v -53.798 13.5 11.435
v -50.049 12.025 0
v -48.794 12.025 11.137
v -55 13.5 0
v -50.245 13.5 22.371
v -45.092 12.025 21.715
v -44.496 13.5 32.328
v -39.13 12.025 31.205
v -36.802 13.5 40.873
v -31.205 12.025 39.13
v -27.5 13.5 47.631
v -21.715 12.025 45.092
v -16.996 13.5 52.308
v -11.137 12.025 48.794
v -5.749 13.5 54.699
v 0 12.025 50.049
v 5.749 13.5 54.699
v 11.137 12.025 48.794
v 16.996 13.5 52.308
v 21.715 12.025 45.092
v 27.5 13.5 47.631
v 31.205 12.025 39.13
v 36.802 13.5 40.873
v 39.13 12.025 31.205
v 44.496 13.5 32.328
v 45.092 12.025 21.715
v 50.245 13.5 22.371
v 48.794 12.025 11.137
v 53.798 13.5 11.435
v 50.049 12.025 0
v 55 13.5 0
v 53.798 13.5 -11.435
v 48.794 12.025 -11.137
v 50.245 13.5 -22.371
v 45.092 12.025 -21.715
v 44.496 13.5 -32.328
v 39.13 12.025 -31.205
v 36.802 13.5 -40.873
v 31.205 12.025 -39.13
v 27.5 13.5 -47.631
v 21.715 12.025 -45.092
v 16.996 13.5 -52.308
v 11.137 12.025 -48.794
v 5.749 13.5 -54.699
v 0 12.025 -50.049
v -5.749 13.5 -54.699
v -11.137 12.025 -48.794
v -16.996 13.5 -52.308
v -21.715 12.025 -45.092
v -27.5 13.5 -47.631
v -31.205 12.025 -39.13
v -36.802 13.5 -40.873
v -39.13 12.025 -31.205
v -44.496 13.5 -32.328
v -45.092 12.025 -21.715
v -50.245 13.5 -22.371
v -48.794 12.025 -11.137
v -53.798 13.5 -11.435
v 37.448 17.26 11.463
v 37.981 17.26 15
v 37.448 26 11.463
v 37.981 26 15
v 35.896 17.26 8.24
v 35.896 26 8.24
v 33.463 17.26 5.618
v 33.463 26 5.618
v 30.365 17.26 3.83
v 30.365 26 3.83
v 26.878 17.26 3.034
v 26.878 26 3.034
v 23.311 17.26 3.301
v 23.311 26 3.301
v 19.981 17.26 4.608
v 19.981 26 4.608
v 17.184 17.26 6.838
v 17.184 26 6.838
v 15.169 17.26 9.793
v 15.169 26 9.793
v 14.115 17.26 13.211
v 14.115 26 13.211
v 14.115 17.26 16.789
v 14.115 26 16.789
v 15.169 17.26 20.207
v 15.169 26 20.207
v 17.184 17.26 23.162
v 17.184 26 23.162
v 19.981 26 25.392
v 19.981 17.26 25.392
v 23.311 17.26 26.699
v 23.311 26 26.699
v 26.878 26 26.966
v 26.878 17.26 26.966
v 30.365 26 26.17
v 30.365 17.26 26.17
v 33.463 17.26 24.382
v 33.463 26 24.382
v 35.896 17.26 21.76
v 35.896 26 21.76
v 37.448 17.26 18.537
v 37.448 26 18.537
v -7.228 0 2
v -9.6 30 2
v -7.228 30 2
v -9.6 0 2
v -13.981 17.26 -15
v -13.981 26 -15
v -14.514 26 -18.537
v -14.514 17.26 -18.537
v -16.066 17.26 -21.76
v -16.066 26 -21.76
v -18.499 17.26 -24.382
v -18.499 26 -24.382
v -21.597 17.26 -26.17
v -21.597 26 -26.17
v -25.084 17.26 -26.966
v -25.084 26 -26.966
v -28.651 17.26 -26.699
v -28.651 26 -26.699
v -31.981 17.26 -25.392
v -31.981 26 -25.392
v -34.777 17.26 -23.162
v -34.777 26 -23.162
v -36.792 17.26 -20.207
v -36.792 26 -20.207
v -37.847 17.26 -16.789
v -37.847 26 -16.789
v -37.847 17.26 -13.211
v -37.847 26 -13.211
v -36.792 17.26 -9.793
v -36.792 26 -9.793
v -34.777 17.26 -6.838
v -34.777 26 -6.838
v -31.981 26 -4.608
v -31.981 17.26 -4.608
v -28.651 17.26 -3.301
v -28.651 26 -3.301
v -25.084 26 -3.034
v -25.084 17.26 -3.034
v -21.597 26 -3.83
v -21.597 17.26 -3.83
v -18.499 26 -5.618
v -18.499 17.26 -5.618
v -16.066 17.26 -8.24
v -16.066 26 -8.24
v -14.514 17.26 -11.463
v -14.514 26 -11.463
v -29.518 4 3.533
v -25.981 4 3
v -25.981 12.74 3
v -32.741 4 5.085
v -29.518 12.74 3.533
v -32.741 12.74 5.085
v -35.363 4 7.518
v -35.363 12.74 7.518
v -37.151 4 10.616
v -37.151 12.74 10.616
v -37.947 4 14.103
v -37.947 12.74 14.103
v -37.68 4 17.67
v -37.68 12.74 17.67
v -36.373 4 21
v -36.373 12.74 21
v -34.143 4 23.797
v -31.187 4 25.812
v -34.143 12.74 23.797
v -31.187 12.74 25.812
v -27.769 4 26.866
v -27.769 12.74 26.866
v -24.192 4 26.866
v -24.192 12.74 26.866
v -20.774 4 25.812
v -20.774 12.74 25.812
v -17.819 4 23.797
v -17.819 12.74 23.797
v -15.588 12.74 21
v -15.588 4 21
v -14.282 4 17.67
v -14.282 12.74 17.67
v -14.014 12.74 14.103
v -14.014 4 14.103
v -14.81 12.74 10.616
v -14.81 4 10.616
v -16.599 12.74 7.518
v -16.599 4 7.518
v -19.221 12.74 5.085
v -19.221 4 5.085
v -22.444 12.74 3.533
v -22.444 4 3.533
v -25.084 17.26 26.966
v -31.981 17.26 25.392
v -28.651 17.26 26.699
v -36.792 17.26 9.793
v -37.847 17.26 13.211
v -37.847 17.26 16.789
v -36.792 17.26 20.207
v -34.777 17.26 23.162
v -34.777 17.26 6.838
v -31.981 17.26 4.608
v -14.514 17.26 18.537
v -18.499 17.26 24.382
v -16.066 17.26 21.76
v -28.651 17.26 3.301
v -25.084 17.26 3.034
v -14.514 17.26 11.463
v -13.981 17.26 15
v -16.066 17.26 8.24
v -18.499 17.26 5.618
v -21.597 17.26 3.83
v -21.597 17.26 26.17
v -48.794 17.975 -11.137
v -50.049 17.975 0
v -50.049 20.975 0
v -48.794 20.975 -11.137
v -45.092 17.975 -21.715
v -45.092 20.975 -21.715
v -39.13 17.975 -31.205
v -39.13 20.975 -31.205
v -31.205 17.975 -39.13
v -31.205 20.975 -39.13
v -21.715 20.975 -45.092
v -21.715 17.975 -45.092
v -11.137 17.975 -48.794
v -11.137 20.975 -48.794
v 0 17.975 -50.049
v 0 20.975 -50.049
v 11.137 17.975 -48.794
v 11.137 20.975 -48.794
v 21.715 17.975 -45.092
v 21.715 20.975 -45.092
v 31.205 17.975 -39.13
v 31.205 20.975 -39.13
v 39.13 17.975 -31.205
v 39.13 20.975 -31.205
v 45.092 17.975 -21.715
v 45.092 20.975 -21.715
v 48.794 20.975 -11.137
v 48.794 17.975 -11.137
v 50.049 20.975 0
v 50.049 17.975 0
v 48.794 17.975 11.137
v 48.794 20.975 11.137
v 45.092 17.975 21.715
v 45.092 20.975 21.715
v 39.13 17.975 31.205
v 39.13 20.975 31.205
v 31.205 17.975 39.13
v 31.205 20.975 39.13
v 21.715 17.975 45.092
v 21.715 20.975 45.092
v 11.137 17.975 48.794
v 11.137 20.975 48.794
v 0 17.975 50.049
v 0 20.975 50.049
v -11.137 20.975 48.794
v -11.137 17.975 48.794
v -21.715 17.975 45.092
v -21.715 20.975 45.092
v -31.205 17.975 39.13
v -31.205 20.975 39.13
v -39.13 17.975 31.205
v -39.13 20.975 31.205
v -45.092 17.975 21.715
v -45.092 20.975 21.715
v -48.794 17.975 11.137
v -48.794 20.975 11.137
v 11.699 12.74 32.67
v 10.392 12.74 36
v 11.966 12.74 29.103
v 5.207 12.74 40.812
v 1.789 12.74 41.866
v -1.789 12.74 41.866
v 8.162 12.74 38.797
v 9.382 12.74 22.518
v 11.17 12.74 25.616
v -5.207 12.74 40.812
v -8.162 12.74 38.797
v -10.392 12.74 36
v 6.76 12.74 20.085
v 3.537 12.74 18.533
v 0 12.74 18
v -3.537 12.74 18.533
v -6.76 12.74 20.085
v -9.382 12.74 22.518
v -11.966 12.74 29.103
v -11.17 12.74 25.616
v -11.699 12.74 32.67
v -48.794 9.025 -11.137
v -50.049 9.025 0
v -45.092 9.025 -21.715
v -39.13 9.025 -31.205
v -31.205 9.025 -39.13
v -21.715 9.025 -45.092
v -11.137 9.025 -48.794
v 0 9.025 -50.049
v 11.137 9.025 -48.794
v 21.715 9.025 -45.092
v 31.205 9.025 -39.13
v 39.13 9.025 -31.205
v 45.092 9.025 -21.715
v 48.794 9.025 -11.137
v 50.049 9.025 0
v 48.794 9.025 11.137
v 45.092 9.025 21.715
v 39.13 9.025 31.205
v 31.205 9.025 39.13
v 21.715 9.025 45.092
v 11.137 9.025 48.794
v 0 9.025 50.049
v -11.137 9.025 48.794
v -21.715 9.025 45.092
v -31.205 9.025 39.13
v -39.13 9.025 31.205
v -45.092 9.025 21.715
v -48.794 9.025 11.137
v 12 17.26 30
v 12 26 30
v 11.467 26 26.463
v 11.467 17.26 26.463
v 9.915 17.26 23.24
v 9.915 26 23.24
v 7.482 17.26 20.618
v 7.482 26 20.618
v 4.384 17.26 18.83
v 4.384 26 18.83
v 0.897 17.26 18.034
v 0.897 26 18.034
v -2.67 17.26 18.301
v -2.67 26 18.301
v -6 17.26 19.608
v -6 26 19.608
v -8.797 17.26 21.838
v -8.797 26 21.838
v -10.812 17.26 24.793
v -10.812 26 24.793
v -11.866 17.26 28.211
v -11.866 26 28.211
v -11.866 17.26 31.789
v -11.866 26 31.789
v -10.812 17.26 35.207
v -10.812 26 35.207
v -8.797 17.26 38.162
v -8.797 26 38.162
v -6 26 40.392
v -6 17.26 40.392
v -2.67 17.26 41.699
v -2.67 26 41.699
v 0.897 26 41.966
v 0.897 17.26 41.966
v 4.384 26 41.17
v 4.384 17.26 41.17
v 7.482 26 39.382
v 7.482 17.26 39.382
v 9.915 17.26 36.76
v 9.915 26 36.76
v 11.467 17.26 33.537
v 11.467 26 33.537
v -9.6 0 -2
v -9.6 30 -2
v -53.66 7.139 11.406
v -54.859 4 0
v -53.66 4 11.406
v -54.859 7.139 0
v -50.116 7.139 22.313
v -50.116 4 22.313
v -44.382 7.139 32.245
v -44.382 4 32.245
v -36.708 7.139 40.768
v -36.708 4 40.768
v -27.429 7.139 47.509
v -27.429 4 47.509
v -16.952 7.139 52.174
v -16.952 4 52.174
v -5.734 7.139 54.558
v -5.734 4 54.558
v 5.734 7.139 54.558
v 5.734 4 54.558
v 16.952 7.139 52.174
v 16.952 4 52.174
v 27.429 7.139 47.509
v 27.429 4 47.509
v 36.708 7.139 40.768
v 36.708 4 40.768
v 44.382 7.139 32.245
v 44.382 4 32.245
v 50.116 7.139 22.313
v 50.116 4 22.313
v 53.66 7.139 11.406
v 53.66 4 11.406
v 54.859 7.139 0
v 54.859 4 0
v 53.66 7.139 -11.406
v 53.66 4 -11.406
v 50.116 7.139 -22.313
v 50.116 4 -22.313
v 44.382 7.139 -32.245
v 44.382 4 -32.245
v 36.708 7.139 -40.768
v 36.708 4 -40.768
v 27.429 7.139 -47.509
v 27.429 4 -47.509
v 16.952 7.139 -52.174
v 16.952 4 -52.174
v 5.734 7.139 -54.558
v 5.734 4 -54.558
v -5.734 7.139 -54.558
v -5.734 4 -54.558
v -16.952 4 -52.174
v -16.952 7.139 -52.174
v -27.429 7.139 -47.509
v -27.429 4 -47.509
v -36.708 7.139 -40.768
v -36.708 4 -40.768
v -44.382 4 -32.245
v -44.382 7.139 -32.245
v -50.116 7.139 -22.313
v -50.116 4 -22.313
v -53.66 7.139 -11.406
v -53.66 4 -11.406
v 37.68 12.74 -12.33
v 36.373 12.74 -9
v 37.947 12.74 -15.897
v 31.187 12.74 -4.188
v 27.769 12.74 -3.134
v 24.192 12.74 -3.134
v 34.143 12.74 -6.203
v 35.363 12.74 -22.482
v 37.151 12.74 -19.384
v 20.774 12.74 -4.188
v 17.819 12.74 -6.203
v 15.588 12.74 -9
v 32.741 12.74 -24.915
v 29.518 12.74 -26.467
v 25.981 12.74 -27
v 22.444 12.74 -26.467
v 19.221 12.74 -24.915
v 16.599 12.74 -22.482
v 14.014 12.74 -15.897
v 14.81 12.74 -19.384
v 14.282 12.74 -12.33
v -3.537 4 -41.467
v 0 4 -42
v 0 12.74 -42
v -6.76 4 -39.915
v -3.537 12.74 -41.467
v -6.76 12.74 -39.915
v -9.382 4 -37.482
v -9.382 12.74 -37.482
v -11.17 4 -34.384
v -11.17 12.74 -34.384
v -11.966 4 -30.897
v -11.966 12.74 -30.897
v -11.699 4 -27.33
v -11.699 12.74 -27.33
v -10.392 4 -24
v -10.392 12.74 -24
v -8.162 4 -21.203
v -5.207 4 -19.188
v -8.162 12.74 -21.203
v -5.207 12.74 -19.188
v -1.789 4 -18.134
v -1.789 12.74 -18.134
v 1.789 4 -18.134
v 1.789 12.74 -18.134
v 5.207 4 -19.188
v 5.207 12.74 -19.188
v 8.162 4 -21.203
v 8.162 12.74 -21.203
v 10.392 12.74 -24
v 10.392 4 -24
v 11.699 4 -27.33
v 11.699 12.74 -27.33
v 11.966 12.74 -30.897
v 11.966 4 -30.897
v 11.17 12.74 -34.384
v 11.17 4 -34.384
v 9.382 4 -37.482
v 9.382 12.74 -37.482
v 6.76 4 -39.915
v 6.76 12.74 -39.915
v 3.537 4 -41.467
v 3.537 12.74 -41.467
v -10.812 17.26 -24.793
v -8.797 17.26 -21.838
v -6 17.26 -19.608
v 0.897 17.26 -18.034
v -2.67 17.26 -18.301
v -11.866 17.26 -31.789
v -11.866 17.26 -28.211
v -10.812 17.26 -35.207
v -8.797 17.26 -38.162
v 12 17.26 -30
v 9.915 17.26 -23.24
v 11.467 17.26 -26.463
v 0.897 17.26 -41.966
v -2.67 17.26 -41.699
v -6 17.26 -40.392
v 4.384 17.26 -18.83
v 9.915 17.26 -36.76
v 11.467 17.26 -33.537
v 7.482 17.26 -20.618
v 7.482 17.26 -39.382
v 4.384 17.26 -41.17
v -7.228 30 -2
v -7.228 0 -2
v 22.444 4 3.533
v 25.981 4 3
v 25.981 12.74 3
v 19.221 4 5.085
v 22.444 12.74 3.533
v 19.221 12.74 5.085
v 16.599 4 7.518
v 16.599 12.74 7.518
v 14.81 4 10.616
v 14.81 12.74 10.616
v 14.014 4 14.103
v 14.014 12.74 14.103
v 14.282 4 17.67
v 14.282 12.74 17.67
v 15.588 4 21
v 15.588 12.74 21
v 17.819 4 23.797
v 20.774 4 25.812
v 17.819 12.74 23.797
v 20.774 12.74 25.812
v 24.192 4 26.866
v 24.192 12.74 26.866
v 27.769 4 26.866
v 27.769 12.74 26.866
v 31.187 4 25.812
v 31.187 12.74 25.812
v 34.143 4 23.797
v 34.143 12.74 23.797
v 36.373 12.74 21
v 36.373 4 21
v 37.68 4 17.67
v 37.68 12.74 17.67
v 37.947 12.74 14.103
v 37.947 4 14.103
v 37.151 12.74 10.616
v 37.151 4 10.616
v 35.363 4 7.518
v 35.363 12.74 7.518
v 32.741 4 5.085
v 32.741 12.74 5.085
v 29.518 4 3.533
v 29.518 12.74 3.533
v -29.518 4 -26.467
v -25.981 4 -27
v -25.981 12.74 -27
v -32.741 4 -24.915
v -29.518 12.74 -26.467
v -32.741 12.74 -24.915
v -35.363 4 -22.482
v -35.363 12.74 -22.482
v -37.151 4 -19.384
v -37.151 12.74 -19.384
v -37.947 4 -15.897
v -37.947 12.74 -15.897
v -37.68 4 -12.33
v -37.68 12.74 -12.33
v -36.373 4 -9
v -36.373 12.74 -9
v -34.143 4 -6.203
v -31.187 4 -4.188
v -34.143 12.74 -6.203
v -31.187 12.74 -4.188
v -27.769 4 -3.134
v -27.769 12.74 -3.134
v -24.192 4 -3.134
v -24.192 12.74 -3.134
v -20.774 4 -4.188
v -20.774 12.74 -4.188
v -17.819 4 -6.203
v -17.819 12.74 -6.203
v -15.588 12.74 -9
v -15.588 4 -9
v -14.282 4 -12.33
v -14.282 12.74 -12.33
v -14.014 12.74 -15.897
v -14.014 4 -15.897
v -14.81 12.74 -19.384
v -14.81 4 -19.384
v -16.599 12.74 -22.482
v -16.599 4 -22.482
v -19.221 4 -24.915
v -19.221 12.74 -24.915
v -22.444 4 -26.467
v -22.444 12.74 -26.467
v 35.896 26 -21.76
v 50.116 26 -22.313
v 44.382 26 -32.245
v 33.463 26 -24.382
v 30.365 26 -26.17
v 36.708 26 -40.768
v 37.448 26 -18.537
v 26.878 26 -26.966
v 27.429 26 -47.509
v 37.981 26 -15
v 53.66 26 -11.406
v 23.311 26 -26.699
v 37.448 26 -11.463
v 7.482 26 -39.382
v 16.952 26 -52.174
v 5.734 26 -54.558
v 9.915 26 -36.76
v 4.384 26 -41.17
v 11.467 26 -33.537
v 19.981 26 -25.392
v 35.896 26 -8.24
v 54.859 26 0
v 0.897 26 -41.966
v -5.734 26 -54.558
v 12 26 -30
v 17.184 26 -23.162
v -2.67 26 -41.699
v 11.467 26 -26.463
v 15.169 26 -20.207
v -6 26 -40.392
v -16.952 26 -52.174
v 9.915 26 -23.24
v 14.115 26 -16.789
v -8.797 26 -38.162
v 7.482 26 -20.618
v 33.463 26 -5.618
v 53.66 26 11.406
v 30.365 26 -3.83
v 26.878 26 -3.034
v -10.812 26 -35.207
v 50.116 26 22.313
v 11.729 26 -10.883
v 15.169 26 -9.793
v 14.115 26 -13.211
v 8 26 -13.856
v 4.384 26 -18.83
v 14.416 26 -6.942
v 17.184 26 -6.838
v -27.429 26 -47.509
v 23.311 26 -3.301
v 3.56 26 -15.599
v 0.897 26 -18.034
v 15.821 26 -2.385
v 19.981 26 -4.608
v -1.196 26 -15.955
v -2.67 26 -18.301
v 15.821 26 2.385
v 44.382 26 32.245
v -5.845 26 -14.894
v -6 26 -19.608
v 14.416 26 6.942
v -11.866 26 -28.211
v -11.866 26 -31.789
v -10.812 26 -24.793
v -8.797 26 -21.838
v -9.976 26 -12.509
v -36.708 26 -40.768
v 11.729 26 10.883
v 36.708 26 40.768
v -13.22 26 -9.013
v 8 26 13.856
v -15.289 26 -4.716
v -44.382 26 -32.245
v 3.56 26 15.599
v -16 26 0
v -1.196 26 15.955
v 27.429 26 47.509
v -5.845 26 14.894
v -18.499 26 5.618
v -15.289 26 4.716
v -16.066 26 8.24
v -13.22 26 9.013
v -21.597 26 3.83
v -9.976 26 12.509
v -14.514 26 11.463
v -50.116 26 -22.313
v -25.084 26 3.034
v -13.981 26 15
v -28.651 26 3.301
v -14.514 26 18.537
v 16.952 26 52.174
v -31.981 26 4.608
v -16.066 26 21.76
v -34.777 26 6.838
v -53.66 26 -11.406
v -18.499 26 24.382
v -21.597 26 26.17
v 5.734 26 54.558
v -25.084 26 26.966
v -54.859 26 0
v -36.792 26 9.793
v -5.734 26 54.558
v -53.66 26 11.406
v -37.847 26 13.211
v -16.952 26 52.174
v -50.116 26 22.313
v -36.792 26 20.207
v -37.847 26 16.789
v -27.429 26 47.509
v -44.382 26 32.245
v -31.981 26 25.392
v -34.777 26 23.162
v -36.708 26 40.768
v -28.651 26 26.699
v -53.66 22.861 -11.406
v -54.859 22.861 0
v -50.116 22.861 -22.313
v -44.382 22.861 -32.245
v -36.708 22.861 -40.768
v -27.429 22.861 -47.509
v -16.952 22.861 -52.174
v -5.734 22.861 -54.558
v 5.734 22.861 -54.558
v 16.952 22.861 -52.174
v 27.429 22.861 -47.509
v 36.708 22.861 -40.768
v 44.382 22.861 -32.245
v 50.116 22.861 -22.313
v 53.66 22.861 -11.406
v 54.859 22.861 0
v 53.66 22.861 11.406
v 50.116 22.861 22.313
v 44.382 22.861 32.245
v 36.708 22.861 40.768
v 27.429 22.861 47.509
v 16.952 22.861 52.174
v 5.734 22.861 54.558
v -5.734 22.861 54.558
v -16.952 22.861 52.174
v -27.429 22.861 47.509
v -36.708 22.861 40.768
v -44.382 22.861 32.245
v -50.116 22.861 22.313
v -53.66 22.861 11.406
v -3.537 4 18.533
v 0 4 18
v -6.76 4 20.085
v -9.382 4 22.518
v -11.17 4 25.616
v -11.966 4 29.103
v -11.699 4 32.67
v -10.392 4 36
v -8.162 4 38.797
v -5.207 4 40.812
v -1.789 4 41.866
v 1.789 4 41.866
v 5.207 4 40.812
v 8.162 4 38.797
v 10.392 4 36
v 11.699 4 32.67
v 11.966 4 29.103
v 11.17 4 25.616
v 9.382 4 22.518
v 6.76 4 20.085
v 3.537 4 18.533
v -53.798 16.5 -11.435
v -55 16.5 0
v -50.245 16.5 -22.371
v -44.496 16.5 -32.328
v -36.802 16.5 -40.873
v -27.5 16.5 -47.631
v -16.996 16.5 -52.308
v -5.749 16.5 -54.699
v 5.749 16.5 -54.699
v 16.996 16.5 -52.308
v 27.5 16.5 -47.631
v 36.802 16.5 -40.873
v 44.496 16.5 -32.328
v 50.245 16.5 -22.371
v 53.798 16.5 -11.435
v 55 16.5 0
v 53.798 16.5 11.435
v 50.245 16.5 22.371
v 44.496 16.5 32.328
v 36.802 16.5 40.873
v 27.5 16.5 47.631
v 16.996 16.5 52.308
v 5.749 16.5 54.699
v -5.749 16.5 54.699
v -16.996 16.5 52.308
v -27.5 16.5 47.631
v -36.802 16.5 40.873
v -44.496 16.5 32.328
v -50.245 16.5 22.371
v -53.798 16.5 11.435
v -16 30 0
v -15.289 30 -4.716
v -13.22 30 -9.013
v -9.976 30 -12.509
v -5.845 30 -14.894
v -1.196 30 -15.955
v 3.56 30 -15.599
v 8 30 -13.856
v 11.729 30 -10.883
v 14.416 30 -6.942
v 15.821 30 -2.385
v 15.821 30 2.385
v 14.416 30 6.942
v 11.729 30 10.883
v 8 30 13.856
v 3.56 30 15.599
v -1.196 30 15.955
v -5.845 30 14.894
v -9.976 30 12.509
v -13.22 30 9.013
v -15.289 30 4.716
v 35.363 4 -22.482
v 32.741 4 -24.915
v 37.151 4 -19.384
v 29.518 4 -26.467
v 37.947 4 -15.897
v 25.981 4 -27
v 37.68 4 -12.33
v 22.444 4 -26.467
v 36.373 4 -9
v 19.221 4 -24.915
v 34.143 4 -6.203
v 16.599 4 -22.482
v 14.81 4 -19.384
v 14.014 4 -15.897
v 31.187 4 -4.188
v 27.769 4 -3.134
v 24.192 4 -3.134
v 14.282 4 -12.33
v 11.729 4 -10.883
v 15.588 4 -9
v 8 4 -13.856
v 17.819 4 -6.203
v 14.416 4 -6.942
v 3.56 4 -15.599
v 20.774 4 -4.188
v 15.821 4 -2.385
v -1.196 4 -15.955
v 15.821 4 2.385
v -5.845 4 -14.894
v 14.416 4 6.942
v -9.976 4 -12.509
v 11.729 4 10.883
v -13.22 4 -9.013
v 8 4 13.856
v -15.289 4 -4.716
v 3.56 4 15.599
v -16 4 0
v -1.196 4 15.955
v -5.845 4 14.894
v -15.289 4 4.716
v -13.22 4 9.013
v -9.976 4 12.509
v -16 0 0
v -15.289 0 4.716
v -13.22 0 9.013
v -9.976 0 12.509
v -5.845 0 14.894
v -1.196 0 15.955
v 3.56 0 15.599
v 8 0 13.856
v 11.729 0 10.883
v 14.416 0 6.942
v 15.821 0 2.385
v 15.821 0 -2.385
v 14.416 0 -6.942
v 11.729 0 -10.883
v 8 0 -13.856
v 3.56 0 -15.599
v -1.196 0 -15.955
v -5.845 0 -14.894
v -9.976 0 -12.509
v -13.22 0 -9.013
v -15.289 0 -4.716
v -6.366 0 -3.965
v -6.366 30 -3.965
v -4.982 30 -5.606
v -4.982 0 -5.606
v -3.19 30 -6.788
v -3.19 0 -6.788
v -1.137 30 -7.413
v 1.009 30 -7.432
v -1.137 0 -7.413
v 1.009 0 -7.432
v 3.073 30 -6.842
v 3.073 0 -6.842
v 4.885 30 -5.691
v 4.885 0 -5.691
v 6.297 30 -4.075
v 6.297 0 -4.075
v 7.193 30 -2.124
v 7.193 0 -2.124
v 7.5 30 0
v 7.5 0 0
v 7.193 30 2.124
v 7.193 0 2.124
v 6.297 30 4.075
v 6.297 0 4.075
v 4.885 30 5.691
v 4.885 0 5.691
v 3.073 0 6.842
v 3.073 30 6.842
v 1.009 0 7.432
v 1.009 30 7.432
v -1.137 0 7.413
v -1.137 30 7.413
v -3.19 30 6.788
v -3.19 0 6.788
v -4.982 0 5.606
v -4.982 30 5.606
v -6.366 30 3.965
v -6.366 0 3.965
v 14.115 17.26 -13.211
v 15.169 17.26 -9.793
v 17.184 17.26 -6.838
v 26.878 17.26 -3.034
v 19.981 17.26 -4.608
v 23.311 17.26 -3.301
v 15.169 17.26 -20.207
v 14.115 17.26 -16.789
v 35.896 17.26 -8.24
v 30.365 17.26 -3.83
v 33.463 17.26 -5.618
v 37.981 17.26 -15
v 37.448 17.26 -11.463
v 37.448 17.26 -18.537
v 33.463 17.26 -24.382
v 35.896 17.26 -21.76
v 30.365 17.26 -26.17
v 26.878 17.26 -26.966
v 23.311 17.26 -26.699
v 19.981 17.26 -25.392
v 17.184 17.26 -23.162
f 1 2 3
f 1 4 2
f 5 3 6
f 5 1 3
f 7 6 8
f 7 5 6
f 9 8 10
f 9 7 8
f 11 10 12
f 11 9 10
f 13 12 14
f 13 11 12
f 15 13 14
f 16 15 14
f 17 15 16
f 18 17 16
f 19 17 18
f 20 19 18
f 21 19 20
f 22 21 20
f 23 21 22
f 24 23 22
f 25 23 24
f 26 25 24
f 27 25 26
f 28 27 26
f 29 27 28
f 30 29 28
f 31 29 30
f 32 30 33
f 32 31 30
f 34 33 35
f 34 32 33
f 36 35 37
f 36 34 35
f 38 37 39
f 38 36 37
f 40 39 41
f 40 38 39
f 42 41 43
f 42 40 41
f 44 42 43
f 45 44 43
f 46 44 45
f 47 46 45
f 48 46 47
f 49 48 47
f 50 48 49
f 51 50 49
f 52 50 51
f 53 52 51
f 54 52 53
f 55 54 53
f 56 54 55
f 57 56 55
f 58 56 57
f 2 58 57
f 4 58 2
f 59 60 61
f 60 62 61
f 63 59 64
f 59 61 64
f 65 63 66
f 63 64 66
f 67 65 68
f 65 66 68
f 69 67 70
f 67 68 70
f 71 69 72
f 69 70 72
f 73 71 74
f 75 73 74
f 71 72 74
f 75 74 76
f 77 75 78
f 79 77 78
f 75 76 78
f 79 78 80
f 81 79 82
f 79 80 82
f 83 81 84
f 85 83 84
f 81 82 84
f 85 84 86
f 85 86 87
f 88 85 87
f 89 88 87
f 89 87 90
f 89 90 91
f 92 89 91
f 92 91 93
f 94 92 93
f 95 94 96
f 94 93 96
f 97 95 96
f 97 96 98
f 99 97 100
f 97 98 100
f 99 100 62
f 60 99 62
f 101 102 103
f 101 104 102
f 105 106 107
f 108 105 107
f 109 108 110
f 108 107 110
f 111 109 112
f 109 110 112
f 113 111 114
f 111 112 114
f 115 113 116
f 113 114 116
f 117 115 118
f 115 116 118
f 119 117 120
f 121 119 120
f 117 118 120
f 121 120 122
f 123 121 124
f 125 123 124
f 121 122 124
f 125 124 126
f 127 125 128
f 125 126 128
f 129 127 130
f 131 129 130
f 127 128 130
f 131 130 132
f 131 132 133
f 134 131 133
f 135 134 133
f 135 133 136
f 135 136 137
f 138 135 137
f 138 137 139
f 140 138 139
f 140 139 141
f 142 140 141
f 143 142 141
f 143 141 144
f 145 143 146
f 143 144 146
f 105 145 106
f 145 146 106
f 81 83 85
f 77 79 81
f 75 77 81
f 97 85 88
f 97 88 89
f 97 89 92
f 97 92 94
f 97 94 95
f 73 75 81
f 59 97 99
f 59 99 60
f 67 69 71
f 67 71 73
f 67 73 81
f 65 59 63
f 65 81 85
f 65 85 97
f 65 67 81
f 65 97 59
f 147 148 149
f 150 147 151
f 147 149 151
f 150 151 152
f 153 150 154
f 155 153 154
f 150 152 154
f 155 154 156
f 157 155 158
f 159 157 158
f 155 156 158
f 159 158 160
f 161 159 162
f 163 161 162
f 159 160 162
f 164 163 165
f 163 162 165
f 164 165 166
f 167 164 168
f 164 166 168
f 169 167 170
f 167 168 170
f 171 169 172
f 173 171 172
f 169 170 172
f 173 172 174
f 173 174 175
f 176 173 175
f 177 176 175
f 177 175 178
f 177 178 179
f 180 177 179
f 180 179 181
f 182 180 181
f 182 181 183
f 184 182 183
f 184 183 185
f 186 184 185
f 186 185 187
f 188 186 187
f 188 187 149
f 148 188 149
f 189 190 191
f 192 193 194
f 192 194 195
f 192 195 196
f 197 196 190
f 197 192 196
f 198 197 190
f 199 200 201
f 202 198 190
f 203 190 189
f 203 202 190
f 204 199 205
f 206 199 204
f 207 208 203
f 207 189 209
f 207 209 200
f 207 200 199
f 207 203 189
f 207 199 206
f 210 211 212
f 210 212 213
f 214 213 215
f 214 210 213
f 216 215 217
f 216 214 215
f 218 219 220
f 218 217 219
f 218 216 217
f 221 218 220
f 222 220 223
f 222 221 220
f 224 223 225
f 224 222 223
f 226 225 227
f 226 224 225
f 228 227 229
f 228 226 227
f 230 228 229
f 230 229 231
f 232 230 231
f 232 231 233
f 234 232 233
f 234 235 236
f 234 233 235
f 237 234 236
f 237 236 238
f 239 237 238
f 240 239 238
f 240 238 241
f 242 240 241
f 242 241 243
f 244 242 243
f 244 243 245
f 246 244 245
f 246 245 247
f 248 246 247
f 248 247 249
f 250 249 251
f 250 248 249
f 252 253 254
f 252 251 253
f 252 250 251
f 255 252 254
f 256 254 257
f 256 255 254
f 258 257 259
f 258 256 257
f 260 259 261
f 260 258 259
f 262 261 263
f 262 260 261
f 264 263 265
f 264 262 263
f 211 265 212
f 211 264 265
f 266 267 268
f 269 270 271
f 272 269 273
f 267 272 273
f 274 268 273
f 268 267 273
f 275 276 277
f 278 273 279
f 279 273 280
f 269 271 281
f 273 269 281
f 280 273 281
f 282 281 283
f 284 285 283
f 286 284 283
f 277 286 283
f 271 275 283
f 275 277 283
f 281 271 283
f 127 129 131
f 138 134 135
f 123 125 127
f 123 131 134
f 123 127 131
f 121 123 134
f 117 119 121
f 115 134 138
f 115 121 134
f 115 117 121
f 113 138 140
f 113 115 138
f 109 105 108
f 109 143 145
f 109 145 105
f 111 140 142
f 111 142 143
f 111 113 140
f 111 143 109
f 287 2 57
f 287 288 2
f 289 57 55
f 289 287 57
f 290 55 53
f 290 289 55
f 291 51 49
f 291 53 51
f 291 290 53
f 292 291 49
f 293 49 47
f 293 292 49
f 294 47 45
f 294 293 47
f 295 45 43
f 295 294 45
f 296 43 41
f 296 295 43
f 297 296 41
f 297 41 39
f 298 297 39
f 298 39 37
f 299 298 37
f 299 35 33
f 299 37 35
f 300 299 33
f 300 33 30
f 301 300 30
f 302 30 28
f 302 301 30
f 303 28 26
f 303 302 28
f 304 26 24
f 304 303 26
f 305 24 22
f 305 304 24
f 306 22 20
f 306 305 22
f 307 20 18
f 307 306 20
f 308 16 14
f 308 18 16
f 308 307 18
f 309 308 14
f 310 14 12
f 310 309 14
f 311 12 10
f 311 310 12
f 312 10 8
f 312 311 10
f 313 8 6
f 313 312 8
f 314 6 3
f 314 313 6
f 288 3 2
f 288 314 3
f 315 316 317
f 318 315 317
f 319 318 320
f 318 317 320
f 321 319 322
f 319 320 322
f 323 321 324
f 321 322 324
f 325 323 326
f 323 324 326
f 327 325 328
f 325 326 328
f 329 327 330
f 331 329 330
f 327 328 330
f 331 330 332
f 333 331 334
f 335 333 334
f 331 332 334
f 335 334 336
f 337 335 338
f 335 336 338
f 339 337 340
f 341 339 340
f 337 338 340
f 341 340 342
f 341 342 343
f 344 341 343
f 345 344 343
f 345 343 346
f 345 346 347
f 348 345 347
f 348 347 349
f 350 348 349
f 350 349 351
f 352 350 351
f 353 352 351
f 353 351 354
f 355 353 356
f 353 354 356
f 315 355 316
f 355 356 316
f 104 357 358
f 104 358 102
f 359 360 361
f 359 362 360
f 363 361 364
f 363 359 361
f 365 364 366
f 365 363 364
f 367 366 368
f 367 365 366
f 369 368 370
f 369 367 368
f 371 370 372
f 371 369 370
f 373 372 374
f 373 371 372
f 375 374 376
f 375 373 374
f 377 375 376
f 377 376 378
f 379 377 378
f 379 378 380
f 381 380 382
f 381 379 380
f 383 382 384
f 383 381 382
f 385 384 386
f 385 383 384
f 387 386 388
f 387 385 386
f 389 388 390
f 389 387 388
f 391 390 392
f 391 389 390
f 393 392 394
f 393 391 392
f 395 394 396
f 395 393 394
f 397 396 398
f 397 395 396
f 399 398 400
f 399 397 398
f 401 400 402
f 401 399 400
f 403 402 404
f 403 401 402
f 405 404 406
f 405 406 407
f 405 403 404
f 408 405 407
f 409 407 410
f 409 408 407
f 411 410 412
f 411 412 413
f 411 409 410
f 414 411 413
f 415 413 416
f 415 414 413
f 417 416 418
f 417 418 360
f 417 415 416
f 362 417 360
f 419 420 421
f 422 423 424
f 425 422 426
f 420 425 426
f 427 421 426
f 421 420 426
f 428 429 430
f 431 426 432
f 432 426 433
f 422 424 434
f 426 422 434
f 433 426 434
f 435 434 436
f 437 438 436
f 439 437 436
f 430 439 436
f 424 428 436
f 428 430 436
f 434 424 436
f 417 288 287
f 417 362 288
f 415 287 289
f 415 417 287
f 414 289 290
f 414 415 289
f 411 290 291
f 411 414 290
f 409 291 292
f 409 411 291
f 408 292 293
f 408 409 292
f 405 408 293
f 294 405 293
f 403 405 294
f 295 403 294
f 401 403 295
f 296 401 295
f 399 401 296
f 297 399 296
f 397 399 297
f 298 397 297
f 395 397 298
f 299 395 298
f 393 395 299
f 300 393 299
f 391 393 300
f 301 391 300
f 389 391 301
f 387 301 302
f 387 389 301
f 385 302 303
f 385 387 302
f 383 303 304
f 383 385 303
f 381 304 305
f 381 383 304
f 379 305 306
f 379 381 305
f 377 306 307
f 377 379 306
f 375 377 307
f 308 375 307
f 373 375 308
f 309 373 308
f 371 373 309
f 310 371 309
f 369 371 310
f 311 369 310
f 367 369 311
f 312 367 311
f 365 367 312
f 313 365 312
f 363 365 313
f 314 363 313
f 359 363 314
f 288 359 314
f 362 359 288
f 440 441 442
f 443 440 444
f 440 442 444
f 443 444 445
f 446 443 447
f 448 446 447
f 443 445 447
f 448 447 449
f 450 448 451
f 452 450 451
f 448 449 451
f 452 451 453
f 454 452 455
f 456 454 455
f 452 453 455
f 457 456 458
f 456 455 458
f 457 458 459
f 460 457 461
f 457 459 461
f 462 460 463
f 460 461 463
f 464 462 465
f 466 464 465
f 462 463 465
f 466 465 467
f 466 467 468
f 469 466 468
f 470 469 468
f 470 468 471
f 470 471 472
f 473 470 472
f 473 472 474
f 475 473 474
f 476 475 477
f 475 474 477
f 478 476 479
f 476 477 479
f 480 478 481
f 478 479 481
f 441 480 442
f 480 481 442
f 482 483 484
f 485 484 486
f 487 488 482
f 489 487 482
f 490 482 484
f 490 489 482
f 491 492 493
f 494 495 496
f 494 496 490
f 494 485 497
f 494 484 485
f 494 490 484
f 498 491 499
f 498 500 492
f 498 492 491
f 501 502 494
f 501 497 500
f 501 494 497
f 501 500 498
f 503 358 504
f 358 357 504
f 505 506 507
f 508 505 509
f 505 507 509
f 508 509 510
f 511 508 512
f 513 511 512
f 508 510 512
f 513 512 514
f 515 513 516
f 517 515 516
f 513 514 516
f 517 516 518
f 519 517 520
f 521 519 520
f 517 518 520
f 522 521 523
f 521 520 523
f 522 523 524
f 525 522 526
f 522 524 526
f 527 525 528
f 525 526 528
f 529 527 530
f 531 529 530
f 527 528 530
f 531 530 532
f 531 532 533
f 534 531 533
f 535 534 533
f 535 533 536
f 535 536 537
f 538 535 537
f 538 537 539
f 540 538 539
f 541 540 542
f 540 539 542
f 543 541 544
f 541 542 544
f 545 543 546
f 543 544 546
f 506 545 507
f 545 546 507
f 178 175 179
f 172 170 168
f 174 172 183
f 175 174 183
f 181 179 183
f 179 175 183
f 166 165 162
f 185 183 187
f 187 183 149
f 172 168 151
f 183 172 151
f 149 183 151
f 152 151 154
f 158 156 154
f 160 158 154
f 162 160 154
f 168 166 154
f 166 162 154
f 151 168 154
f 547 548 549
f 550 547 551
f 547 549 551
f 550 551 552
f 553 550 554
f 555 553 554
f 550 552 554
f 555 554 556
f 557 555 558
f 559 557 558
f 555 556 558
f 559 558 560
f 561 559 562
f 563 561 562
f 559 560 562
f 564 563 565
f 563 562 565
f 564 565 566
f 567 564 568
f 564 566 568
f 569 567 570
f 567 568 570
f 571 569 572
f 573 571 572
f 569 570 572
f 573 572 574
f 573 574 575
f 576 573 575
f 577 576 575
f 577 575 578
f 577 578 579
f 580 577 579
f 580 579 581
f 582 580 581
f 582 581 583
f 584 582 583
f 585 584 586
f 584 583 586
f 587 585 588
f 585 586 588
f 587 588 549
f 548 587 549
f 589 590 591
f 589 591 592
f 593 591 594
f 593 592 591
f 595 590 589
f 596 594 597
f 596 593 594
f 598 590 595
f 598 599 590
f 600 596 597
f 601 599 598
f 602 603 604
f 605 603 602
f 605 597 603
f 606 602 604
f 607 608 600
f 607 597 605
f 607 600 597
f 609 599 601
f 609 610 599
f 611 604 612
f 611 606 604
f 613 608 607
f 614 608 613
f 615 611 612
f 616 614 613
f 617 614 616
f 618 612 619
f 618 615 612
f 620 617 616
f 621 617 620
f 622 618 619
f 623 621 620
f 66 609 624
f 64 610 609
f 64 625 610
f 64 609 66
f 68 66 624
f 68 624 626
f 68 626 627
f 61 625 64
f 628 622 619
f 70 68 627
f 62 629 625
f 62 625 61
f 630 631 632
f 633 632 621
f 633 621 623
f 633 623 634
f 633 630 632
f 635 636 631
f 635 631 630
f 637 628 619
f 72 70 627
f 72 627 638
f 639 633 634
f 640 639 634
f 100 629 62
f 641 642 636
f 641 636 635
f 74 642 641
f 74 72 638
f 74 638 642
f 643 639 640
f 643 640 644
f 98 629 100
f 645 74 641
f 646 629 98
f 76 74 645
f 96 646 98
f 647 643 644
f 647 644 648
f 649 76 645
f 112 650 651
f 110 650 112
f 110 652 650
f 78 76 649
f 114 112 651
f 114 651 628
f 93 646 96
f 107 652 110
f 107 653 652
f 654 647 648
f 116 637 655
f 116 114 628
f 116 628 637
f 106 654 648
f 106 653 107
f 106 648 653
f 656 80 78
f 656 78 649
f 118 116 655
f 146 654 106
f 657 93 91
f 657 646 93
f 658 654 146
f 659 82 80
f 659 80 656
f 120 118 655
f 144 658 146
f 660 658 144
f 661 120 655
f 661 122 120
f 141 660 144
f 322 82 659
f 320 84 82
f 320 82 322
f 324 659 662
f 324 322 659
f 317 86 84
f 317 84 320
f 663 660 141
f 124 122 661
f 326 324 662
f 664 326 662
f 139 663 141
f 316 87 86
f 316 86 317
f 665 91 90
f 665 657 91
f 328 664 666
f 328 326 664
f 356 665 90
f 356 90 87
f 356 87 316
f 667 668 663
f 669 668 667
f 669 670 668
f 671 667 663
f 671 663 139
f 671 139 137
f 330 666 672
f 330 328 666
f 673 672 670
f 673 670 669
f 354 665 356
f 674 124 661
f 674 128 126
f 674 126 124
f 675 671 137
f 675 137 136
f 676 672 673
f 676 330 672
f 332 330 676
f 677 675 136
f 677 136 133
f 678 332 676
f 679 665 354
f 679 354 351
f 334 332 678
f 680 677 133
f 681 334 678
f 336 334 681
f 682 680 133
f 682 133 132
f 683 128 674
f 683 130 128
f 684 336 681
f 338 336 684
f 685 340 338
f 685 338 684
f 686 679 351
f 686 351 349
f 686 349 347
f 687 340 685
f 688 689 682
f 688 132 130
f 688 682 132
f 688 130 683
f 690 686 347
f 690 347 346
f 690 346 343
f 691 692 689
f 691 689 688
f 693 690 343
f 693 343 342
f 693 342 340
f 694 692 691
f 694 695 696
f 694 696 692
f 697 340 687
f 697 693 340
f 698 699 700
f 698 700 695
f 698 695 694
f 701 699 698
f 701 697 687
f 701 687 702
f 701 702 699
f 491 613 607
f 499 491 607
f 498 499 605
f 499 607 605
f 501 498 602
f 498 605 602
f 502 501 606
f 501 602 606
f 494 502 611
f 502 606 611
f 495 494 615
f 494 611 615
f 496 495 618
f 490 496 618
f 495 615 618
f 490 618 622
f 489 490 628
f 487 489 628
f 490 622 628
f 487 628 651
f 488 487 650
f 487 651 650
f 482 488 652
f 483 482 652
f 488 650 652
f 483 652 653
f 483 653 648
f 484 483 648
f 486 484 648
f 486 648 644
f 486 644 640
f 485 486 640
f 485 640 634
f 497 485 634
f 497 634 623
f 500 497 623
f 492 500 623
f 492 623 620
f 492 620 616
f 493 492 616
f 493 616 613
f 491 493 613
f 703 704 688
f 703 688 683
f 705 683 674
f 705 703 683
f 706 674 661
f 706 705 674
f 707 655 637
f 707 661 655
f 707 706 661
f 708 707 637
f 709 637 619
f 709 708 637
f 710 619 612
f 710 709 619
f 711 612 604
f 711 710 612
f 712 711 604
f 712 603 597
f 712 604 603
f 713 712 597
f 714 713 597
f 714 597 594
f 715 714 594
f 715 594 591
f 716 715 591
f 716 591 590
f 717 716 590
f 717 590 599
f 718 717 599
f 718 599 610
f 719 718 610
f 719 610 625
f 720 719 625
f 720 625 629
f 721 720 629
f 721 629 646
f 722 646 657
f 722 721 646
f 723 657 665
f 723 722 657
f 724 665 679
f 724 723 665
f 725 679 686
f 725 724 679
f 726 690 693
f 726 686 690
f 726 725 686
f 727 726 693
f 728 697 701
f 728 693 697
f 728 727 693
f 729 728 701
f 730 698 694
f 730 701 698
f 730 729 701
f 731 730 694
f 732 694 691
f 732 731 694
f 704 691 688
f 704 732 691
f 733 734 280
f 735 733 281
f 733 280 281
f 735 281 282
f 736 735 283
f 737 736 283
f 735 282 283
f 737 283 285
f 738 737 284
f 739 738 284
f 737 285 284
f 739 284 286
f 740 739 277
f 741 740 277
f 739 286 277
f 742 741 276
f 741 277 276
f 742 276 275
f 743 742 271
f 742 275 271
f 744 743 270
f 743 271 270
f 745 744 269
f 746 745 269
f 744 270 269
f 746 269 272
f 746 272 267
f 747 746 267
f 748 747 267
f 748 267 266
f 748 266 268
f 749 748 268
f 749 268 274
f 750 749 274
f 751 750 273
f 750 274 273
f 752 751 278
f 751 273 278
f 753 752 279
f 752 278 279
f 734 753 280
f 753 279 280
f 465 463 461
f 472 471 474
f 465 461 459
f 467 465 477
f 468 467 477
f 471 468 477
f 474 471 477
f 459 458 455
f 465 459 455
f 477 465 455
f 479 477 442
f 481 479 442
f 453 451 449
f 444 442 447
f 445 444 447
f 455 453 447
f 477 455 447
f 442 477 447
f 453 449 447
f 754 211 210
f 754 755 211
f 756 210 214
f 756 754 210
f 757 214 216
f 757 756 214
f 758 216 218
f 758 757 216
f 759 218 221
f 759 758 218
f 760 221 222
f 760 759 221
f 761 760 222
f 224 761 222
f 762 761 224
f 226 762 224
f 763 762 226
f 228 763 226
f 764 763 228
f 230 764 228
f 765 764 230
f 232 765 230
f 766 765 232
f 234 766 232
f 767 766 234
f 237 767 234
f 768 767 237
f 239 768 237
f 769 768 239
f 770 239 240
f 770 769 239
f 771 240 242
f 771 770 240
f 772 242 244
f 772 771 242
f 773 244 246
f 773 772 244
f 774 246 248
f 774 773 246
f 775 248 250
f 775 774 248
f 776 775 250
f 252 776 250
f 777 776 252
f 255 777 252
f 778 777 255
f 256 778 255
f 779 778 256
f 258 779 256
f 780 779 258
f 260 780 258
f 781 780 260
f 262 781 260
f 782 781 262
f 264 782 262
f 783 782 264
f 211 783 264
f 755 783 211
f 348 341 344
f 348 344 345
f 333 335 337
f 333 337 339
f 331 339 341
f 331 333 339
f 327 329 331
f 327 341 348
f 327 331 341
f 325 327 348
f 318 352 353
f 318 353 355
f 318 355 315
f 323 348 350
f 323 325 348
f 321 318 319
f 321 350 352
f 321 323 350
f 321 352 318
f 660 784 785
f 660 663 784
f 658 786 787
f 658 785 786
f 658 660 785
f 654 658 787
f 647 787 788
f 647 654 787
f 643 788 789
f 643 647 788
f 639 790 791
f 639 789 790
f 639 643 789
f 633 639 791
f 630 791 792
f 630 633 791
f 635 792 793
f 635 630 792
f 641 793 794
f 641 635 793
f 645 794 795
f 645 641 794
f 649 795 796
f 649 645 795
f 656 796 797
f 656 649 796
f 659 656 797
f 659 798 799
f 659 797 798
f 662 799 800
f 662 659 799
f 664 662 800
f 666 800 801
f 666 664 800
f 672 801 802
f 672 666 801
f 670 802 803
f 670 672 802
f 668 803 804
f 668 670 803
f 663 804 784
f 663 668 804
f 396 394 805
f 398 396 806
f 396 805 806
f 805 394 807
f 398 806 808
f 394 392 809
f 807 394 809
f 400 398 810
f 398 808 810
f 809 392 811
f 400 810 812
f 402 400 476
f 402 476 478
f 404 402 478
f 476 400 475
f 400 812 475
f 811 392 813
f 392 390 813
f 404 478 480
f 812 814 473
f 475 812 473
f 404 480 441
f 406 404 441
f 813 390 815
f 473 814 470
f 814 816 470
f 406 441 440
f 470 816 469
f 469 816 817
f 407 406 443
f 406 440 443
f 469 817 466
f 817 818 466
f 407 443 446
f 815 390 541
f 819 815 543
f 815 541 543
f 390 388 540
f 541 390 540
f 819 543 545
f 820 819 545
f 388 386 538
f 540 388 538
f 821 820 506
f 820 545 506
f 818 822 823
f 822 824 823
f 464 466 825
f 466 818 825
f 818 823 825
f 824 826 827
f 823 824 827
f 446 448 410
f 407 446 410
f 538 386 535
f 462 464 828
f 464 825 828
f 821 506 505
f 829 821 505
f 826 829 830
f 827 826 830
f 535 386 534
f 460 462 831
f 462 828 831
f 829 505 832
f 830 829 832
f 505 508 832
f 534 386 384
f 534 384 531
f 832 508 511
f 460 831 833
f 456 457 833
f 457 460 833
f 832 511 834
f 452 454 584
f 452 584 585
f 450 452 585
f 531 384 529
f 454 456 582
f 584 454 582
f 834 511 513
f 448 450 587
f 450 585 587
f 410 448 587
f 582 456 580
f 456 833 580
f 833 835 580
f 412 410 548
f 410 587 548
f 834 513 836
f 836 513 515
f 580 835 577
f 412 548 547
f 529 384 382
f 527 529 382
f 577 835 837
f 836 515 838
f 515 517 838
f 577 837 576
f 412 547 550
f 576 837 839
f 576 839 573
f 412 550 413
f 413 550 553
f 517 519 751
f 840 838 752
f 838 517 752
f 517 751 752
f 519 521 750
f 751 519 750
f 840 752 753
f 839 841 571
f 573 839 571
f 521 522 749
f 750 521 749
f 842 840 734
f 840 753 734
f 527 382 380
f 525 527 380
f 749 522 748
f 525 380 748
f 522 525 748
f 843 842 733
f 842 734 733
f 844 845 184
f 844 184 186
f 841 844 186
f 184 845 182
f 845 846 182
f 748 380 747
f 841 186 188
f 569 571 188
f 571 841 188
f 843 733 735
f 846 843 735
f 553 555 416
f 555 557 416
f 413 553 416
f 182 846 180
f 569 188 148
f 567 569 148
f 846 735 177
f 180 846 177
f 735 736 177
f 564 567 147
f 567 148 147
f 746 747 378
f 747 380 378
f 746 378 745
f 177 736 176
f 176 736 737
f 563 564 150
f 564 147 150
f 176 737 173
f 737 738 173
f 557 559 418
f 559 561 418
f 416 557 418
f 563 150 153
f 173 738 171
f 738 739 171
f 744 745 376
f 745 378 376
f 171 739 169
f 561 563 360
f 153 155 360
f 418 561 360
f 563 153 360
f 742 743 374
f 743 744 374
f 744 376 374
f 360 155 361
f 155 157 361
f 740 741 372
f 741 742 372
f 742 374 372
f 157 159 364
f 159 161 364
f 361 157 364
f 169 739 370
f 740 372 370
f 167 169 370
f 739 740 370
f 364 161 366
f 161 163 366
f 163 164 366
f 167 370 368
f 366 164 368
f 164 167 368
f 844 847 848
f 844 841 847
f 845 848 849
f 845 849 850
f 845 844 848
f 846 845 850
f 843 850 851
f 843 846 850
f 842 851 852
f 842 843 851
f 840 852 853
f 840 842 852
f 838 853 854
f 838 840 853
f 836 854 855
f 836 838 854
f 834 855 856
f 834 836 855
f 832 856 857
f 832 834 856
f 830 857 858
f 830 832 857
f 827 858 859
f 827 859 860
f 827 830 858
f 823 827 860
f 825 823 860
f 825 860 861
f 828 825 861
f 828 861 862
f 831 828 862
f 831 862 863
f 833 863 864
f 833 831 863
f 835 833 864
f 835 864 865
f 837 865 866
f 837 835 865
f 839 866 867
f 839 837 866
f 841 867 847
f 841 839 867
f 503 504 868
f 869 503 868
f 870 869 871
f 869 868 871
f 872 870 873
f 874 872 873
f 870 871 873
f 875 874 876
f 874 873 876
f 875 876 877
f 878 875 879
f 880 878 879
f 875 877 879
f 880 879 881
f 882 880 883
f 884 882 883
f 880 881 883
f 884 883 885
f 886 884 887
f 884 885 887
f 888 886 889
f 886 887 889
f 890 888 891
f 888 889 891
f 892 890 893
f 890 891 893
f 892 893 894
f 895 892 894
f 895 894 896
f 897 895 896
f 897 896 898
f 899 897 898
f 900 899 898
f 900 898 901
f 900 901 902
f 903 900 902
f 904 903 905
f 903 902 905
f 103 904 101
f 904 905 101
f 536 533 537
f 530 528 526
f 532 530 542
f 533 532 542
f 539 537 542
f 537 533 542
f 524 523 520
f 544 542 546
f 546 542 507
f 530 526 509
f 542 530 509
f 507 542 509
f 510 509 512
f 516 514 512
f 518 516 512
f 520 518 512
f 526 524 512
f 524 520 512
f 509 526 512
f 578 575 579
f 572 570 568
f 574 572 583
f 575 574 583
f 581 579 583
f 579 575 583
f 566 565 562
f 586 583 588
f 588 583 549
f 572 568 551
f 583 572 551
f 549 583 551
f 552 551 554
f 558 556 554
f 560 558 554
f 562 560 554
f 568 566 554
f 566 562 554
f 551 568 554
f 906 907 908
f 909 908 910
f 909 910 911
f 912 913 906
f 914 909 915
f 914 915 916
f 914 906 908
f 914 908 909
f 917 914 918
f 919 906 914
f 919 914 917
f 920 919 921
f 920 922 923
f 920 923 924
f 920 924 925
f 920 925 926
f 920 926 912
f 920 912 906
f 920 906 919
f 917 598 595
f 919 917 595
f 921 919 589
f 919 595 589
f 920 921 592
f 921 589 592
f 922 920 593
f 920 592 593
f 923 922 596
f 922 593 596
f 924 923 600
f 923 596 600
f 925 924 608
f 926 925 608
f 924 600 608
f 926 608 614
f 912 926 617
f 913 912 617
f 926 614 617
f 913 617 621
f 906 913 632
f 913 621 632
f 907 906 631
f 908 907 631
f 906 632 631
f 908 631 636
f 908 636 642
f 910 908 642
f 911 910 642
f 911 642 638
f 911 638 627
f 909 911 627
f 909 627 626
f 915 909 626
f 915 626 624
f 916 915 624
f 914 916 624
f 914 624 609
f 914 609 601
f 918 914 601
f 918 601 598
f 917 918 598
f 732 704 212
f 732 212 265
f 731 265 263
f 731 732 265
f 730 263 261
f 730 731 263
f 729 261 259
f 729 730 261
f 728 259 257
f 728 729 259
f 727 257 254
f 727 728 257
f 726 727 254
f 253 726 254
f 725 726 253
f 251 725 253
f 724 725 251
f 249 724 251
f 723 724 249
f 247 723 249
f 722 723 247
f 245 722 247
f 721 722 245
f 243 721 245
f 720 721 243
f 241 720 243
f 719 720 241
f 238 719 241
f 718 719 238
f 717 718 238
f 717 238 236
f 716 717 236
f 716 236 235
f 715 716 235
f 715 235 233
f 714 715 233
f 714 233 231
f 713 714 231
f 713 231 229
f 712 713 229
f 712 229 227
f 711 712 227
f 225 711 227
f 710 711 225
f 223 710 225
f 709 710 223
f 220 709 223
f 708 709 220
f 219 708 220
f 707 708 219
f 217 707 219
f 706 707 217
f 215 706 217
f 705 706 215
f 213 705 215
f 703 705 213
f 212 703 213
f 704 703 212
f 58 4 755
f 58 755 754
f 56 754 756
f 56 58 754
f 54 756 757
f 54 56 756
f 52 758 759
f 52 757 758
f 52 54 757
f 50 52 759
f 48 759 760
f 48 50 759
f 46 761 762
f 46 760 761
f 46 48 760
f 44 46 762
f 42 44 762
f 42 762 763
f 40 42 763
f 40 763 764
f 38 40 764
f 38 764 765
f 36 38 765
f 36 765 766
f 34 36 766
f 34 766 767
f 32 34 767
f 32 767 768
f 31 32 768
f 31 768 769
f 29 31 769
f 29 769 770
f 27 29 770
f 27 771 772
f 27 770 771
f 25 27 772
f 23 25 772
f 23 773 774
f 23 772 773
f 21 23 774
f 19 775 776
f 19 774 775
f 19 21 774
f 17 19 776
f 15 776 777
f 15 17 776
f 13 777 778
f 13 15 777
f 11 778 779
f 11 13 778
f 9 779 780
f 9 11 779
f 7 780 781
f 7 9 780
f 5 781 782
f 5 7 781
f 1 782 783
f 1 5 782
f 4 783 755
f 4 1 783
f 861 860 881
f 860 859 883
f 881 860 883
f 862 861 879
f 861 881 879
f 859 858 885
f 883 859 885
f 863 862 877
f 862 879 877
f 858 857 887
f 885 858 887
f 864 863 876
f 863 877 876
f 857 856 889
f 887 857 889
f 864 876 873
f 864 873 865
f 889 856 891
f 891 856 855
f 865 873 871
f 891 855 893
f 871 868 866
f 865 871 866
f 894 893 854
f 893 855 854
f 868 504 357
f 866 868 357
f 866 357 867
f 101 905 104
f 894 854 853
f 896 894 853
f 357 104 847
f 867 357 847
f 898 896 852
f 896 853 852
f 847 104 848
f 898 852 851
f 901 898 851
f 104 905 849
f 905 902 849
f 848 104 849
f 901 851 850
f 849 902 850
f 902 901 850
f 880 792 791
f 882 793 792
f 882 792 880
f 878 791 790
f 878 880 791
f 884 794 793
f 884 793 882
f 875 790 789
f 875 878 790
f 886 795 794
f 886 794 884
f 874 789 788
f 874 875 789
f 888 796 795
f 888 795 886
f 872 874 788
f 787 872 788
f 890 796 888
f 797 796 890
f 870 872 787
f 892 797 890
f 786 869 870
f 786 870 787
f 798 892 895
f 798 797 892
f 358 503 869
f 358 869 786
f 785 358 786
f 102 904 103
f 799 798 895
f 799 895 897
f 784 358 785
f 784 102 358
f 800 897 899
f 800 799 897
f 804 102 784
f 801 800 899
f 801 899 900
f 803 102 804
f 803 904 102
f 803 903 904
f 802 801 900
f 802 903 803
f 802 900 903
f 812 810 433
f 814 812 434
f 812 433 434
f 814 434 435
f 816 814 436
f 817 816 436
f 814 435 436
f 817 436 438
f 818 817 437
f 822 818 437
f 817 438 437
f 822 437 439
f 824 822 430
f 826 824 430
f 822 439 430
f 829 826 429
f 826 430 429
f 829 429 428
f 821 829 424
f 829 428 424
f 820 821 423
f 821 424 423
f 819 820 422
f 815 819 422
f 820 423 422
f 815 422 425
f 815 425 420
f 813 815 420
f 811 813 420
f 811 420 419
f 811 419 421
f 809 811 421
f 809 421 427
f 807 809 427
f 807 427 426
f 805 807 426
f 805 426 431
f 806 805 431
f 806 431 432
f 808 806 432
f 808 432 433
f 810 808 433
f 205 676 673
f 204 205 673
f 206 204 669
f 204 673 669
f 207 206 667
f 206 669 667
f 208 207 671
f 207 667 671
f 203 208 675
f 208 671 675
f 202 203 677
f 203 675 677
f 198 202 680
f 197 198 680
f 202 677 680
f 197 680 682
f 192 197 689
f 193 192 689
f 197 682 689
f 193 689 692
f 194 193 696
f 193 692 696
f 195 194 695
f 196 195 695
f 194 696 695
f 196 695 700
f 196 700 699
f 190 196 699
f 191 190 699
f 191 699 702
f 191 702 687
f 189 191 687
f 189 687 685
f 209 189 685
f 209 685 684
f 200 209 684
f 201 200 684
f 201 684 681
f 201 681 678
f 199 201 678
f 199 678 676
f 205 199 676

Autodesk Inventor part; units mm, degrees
ref_plane "YZ Plane" through (0, 0, 0) normal (1, 0, 0) x (0, 1, 0)
ref_plane "XZ Plane" through (0, 0, 0) normal (0, 1, 0) x (-1, 0, 0)
ref_plane "XY Plane" through (0, 0, 0) normal (0, 0, 1) x (1, 0, 0)
sketch "草图1" plane through (0, 0, 0) normal (0, 0, 1) x (1, 0, 0)
  line L0 (0, 0) -> (0, 30)
  line L1 (0, 30) -> (-16, 30)
  line L2 (-16, 30) -> (-16, 26)
  line L3 (-16, 26) -> (-55, 26)
  line L4 (-54.8586, 22.861) -> (-50.0487, 20.9752)
  line L5 (-50.0487, 20.9752) -> (-50.0487, 17.9752)
  line L6 (-50.0487, 17.9752) -> (-55, 16.5)
  line L7 (0, 0) -> (-16, 0)
  line L8 (-16, 0) -> (-16, 4)
  line L9 (-16, 4) -> (-55, 4)
  line L10 (-55, 13.5) -> (-50.0487, 12.0248)
  line L11 (-50.0487, 12.0248) -> (-50.0487, 9.0248)
  line L12 (-50.0487, 9.0248) -> (-54.8586, 7.139)
  line L13 (-55, 16.5) -> (-55, 13.5)
  line L14 (-54.8586, 4) -> (-54.8586, 7.139)
  line L15 (-54.8586, 26) -> (-54.8586, 22.861)
  point P0 (-54.9901, 12.2219)
  dimension "d0" = 30
  dimension "d1" = 16
  dimension "d2" = 4
  dimension "d3" = 39
  dimension "d4" = 22
  dimension "d5" = 38
  dimension "d7" = 3
  dimension "d8" = 38
  dimension "d9" = 3
revolve "旋转1" add sketch "草图1" angle 360 about axis through (0, 0, 0) along (0, 1, 0)
sketch "草图2" plane through (0, 26, 0) normal (0, 1, 0) x (1, 0, 0)
  circle A0 centre (0, 0) radius 54.8586 projected
  circle A1 centre (0, 0) radius 16 projected
  circle A2 centre (0, 0) radius 30
  circle A3 centre (0, -30) radius 12
  circle A4 centre (25.9808, -15) radius 12
  circle A5 centre (25.9808, 15) radius 12
  circle A6 centre (0, 30) radius 12
  circle A7 centre (-25.9808, 15) radius 12
  circle A8 centre (-25.9808, -15) radius 12
  dimension "d14" = 24
  dimension "d17" = 360
sketch "草图3" plane through (0, 0, 0) normal (0, -1, 0) x (1, 0, 0)
  circle A0 centre (0, 0) radius 16 projected
  arc A1 (-7.2284, -2) -> (-7.2284, 2) centre (0, 0) ccw
  line L0 (-9.6, 0) -> (-9.6, 2)
  line L1 (-9.6, 2) -> (-9.6, -2)
  line L2 (-9.6, -2) -> (-7.2284, -2)
  line L3 (-9.6, 2) -> (-7.2284, 2)
  dimension "d19" = 15
  dimension "d20" = 9.6
  dimension "d21" = 2
  dimension "d22" = 4
extrude "拉伸1" cut sketch "草图3" against normal through all contours L2 L1 L0 L3 A1
extrude "拉伸2" cut sketch "草图2" against normal blind 8.74 contours A5 A2 | A2 A5 | A4 A2 | A2 A4 | A6 A2 | A2 A6 | A3 A2 | A2 A3 | A7 A2 | A2 A7 | A8 A2 | A2 A8
sketch "草图4" plane through (0, 4, 0) normal (0, -1, 0) x (1, 0, 0)
  circle A0 centre (0, 0) radius 16 projected
  circle A1 centre (-25.9808, -15) radius 12 projected
  circle A2 centre (-25.9808, 15) radius 12 projected
  circle A3 centre (0, 30) radius 12 projected
  point P0 (0, 30)
  point P1 (25.9808, 15)
  point P2 (25.9808, -15)
  point P3 (0, -30)
  point P4 (-25.9808, -15)
  dimension "d29" = 360
hole "孔1" at (-25.9808, 4, 15) at (0, 4, 30) at (25.9808, 4, 15) at (25.9808, 4, -15) at (0, 4, -30) at (-25.9808, 4, -15) direction (0, 1, 0) diameter 24 depth 8.74
properties part number "1"
